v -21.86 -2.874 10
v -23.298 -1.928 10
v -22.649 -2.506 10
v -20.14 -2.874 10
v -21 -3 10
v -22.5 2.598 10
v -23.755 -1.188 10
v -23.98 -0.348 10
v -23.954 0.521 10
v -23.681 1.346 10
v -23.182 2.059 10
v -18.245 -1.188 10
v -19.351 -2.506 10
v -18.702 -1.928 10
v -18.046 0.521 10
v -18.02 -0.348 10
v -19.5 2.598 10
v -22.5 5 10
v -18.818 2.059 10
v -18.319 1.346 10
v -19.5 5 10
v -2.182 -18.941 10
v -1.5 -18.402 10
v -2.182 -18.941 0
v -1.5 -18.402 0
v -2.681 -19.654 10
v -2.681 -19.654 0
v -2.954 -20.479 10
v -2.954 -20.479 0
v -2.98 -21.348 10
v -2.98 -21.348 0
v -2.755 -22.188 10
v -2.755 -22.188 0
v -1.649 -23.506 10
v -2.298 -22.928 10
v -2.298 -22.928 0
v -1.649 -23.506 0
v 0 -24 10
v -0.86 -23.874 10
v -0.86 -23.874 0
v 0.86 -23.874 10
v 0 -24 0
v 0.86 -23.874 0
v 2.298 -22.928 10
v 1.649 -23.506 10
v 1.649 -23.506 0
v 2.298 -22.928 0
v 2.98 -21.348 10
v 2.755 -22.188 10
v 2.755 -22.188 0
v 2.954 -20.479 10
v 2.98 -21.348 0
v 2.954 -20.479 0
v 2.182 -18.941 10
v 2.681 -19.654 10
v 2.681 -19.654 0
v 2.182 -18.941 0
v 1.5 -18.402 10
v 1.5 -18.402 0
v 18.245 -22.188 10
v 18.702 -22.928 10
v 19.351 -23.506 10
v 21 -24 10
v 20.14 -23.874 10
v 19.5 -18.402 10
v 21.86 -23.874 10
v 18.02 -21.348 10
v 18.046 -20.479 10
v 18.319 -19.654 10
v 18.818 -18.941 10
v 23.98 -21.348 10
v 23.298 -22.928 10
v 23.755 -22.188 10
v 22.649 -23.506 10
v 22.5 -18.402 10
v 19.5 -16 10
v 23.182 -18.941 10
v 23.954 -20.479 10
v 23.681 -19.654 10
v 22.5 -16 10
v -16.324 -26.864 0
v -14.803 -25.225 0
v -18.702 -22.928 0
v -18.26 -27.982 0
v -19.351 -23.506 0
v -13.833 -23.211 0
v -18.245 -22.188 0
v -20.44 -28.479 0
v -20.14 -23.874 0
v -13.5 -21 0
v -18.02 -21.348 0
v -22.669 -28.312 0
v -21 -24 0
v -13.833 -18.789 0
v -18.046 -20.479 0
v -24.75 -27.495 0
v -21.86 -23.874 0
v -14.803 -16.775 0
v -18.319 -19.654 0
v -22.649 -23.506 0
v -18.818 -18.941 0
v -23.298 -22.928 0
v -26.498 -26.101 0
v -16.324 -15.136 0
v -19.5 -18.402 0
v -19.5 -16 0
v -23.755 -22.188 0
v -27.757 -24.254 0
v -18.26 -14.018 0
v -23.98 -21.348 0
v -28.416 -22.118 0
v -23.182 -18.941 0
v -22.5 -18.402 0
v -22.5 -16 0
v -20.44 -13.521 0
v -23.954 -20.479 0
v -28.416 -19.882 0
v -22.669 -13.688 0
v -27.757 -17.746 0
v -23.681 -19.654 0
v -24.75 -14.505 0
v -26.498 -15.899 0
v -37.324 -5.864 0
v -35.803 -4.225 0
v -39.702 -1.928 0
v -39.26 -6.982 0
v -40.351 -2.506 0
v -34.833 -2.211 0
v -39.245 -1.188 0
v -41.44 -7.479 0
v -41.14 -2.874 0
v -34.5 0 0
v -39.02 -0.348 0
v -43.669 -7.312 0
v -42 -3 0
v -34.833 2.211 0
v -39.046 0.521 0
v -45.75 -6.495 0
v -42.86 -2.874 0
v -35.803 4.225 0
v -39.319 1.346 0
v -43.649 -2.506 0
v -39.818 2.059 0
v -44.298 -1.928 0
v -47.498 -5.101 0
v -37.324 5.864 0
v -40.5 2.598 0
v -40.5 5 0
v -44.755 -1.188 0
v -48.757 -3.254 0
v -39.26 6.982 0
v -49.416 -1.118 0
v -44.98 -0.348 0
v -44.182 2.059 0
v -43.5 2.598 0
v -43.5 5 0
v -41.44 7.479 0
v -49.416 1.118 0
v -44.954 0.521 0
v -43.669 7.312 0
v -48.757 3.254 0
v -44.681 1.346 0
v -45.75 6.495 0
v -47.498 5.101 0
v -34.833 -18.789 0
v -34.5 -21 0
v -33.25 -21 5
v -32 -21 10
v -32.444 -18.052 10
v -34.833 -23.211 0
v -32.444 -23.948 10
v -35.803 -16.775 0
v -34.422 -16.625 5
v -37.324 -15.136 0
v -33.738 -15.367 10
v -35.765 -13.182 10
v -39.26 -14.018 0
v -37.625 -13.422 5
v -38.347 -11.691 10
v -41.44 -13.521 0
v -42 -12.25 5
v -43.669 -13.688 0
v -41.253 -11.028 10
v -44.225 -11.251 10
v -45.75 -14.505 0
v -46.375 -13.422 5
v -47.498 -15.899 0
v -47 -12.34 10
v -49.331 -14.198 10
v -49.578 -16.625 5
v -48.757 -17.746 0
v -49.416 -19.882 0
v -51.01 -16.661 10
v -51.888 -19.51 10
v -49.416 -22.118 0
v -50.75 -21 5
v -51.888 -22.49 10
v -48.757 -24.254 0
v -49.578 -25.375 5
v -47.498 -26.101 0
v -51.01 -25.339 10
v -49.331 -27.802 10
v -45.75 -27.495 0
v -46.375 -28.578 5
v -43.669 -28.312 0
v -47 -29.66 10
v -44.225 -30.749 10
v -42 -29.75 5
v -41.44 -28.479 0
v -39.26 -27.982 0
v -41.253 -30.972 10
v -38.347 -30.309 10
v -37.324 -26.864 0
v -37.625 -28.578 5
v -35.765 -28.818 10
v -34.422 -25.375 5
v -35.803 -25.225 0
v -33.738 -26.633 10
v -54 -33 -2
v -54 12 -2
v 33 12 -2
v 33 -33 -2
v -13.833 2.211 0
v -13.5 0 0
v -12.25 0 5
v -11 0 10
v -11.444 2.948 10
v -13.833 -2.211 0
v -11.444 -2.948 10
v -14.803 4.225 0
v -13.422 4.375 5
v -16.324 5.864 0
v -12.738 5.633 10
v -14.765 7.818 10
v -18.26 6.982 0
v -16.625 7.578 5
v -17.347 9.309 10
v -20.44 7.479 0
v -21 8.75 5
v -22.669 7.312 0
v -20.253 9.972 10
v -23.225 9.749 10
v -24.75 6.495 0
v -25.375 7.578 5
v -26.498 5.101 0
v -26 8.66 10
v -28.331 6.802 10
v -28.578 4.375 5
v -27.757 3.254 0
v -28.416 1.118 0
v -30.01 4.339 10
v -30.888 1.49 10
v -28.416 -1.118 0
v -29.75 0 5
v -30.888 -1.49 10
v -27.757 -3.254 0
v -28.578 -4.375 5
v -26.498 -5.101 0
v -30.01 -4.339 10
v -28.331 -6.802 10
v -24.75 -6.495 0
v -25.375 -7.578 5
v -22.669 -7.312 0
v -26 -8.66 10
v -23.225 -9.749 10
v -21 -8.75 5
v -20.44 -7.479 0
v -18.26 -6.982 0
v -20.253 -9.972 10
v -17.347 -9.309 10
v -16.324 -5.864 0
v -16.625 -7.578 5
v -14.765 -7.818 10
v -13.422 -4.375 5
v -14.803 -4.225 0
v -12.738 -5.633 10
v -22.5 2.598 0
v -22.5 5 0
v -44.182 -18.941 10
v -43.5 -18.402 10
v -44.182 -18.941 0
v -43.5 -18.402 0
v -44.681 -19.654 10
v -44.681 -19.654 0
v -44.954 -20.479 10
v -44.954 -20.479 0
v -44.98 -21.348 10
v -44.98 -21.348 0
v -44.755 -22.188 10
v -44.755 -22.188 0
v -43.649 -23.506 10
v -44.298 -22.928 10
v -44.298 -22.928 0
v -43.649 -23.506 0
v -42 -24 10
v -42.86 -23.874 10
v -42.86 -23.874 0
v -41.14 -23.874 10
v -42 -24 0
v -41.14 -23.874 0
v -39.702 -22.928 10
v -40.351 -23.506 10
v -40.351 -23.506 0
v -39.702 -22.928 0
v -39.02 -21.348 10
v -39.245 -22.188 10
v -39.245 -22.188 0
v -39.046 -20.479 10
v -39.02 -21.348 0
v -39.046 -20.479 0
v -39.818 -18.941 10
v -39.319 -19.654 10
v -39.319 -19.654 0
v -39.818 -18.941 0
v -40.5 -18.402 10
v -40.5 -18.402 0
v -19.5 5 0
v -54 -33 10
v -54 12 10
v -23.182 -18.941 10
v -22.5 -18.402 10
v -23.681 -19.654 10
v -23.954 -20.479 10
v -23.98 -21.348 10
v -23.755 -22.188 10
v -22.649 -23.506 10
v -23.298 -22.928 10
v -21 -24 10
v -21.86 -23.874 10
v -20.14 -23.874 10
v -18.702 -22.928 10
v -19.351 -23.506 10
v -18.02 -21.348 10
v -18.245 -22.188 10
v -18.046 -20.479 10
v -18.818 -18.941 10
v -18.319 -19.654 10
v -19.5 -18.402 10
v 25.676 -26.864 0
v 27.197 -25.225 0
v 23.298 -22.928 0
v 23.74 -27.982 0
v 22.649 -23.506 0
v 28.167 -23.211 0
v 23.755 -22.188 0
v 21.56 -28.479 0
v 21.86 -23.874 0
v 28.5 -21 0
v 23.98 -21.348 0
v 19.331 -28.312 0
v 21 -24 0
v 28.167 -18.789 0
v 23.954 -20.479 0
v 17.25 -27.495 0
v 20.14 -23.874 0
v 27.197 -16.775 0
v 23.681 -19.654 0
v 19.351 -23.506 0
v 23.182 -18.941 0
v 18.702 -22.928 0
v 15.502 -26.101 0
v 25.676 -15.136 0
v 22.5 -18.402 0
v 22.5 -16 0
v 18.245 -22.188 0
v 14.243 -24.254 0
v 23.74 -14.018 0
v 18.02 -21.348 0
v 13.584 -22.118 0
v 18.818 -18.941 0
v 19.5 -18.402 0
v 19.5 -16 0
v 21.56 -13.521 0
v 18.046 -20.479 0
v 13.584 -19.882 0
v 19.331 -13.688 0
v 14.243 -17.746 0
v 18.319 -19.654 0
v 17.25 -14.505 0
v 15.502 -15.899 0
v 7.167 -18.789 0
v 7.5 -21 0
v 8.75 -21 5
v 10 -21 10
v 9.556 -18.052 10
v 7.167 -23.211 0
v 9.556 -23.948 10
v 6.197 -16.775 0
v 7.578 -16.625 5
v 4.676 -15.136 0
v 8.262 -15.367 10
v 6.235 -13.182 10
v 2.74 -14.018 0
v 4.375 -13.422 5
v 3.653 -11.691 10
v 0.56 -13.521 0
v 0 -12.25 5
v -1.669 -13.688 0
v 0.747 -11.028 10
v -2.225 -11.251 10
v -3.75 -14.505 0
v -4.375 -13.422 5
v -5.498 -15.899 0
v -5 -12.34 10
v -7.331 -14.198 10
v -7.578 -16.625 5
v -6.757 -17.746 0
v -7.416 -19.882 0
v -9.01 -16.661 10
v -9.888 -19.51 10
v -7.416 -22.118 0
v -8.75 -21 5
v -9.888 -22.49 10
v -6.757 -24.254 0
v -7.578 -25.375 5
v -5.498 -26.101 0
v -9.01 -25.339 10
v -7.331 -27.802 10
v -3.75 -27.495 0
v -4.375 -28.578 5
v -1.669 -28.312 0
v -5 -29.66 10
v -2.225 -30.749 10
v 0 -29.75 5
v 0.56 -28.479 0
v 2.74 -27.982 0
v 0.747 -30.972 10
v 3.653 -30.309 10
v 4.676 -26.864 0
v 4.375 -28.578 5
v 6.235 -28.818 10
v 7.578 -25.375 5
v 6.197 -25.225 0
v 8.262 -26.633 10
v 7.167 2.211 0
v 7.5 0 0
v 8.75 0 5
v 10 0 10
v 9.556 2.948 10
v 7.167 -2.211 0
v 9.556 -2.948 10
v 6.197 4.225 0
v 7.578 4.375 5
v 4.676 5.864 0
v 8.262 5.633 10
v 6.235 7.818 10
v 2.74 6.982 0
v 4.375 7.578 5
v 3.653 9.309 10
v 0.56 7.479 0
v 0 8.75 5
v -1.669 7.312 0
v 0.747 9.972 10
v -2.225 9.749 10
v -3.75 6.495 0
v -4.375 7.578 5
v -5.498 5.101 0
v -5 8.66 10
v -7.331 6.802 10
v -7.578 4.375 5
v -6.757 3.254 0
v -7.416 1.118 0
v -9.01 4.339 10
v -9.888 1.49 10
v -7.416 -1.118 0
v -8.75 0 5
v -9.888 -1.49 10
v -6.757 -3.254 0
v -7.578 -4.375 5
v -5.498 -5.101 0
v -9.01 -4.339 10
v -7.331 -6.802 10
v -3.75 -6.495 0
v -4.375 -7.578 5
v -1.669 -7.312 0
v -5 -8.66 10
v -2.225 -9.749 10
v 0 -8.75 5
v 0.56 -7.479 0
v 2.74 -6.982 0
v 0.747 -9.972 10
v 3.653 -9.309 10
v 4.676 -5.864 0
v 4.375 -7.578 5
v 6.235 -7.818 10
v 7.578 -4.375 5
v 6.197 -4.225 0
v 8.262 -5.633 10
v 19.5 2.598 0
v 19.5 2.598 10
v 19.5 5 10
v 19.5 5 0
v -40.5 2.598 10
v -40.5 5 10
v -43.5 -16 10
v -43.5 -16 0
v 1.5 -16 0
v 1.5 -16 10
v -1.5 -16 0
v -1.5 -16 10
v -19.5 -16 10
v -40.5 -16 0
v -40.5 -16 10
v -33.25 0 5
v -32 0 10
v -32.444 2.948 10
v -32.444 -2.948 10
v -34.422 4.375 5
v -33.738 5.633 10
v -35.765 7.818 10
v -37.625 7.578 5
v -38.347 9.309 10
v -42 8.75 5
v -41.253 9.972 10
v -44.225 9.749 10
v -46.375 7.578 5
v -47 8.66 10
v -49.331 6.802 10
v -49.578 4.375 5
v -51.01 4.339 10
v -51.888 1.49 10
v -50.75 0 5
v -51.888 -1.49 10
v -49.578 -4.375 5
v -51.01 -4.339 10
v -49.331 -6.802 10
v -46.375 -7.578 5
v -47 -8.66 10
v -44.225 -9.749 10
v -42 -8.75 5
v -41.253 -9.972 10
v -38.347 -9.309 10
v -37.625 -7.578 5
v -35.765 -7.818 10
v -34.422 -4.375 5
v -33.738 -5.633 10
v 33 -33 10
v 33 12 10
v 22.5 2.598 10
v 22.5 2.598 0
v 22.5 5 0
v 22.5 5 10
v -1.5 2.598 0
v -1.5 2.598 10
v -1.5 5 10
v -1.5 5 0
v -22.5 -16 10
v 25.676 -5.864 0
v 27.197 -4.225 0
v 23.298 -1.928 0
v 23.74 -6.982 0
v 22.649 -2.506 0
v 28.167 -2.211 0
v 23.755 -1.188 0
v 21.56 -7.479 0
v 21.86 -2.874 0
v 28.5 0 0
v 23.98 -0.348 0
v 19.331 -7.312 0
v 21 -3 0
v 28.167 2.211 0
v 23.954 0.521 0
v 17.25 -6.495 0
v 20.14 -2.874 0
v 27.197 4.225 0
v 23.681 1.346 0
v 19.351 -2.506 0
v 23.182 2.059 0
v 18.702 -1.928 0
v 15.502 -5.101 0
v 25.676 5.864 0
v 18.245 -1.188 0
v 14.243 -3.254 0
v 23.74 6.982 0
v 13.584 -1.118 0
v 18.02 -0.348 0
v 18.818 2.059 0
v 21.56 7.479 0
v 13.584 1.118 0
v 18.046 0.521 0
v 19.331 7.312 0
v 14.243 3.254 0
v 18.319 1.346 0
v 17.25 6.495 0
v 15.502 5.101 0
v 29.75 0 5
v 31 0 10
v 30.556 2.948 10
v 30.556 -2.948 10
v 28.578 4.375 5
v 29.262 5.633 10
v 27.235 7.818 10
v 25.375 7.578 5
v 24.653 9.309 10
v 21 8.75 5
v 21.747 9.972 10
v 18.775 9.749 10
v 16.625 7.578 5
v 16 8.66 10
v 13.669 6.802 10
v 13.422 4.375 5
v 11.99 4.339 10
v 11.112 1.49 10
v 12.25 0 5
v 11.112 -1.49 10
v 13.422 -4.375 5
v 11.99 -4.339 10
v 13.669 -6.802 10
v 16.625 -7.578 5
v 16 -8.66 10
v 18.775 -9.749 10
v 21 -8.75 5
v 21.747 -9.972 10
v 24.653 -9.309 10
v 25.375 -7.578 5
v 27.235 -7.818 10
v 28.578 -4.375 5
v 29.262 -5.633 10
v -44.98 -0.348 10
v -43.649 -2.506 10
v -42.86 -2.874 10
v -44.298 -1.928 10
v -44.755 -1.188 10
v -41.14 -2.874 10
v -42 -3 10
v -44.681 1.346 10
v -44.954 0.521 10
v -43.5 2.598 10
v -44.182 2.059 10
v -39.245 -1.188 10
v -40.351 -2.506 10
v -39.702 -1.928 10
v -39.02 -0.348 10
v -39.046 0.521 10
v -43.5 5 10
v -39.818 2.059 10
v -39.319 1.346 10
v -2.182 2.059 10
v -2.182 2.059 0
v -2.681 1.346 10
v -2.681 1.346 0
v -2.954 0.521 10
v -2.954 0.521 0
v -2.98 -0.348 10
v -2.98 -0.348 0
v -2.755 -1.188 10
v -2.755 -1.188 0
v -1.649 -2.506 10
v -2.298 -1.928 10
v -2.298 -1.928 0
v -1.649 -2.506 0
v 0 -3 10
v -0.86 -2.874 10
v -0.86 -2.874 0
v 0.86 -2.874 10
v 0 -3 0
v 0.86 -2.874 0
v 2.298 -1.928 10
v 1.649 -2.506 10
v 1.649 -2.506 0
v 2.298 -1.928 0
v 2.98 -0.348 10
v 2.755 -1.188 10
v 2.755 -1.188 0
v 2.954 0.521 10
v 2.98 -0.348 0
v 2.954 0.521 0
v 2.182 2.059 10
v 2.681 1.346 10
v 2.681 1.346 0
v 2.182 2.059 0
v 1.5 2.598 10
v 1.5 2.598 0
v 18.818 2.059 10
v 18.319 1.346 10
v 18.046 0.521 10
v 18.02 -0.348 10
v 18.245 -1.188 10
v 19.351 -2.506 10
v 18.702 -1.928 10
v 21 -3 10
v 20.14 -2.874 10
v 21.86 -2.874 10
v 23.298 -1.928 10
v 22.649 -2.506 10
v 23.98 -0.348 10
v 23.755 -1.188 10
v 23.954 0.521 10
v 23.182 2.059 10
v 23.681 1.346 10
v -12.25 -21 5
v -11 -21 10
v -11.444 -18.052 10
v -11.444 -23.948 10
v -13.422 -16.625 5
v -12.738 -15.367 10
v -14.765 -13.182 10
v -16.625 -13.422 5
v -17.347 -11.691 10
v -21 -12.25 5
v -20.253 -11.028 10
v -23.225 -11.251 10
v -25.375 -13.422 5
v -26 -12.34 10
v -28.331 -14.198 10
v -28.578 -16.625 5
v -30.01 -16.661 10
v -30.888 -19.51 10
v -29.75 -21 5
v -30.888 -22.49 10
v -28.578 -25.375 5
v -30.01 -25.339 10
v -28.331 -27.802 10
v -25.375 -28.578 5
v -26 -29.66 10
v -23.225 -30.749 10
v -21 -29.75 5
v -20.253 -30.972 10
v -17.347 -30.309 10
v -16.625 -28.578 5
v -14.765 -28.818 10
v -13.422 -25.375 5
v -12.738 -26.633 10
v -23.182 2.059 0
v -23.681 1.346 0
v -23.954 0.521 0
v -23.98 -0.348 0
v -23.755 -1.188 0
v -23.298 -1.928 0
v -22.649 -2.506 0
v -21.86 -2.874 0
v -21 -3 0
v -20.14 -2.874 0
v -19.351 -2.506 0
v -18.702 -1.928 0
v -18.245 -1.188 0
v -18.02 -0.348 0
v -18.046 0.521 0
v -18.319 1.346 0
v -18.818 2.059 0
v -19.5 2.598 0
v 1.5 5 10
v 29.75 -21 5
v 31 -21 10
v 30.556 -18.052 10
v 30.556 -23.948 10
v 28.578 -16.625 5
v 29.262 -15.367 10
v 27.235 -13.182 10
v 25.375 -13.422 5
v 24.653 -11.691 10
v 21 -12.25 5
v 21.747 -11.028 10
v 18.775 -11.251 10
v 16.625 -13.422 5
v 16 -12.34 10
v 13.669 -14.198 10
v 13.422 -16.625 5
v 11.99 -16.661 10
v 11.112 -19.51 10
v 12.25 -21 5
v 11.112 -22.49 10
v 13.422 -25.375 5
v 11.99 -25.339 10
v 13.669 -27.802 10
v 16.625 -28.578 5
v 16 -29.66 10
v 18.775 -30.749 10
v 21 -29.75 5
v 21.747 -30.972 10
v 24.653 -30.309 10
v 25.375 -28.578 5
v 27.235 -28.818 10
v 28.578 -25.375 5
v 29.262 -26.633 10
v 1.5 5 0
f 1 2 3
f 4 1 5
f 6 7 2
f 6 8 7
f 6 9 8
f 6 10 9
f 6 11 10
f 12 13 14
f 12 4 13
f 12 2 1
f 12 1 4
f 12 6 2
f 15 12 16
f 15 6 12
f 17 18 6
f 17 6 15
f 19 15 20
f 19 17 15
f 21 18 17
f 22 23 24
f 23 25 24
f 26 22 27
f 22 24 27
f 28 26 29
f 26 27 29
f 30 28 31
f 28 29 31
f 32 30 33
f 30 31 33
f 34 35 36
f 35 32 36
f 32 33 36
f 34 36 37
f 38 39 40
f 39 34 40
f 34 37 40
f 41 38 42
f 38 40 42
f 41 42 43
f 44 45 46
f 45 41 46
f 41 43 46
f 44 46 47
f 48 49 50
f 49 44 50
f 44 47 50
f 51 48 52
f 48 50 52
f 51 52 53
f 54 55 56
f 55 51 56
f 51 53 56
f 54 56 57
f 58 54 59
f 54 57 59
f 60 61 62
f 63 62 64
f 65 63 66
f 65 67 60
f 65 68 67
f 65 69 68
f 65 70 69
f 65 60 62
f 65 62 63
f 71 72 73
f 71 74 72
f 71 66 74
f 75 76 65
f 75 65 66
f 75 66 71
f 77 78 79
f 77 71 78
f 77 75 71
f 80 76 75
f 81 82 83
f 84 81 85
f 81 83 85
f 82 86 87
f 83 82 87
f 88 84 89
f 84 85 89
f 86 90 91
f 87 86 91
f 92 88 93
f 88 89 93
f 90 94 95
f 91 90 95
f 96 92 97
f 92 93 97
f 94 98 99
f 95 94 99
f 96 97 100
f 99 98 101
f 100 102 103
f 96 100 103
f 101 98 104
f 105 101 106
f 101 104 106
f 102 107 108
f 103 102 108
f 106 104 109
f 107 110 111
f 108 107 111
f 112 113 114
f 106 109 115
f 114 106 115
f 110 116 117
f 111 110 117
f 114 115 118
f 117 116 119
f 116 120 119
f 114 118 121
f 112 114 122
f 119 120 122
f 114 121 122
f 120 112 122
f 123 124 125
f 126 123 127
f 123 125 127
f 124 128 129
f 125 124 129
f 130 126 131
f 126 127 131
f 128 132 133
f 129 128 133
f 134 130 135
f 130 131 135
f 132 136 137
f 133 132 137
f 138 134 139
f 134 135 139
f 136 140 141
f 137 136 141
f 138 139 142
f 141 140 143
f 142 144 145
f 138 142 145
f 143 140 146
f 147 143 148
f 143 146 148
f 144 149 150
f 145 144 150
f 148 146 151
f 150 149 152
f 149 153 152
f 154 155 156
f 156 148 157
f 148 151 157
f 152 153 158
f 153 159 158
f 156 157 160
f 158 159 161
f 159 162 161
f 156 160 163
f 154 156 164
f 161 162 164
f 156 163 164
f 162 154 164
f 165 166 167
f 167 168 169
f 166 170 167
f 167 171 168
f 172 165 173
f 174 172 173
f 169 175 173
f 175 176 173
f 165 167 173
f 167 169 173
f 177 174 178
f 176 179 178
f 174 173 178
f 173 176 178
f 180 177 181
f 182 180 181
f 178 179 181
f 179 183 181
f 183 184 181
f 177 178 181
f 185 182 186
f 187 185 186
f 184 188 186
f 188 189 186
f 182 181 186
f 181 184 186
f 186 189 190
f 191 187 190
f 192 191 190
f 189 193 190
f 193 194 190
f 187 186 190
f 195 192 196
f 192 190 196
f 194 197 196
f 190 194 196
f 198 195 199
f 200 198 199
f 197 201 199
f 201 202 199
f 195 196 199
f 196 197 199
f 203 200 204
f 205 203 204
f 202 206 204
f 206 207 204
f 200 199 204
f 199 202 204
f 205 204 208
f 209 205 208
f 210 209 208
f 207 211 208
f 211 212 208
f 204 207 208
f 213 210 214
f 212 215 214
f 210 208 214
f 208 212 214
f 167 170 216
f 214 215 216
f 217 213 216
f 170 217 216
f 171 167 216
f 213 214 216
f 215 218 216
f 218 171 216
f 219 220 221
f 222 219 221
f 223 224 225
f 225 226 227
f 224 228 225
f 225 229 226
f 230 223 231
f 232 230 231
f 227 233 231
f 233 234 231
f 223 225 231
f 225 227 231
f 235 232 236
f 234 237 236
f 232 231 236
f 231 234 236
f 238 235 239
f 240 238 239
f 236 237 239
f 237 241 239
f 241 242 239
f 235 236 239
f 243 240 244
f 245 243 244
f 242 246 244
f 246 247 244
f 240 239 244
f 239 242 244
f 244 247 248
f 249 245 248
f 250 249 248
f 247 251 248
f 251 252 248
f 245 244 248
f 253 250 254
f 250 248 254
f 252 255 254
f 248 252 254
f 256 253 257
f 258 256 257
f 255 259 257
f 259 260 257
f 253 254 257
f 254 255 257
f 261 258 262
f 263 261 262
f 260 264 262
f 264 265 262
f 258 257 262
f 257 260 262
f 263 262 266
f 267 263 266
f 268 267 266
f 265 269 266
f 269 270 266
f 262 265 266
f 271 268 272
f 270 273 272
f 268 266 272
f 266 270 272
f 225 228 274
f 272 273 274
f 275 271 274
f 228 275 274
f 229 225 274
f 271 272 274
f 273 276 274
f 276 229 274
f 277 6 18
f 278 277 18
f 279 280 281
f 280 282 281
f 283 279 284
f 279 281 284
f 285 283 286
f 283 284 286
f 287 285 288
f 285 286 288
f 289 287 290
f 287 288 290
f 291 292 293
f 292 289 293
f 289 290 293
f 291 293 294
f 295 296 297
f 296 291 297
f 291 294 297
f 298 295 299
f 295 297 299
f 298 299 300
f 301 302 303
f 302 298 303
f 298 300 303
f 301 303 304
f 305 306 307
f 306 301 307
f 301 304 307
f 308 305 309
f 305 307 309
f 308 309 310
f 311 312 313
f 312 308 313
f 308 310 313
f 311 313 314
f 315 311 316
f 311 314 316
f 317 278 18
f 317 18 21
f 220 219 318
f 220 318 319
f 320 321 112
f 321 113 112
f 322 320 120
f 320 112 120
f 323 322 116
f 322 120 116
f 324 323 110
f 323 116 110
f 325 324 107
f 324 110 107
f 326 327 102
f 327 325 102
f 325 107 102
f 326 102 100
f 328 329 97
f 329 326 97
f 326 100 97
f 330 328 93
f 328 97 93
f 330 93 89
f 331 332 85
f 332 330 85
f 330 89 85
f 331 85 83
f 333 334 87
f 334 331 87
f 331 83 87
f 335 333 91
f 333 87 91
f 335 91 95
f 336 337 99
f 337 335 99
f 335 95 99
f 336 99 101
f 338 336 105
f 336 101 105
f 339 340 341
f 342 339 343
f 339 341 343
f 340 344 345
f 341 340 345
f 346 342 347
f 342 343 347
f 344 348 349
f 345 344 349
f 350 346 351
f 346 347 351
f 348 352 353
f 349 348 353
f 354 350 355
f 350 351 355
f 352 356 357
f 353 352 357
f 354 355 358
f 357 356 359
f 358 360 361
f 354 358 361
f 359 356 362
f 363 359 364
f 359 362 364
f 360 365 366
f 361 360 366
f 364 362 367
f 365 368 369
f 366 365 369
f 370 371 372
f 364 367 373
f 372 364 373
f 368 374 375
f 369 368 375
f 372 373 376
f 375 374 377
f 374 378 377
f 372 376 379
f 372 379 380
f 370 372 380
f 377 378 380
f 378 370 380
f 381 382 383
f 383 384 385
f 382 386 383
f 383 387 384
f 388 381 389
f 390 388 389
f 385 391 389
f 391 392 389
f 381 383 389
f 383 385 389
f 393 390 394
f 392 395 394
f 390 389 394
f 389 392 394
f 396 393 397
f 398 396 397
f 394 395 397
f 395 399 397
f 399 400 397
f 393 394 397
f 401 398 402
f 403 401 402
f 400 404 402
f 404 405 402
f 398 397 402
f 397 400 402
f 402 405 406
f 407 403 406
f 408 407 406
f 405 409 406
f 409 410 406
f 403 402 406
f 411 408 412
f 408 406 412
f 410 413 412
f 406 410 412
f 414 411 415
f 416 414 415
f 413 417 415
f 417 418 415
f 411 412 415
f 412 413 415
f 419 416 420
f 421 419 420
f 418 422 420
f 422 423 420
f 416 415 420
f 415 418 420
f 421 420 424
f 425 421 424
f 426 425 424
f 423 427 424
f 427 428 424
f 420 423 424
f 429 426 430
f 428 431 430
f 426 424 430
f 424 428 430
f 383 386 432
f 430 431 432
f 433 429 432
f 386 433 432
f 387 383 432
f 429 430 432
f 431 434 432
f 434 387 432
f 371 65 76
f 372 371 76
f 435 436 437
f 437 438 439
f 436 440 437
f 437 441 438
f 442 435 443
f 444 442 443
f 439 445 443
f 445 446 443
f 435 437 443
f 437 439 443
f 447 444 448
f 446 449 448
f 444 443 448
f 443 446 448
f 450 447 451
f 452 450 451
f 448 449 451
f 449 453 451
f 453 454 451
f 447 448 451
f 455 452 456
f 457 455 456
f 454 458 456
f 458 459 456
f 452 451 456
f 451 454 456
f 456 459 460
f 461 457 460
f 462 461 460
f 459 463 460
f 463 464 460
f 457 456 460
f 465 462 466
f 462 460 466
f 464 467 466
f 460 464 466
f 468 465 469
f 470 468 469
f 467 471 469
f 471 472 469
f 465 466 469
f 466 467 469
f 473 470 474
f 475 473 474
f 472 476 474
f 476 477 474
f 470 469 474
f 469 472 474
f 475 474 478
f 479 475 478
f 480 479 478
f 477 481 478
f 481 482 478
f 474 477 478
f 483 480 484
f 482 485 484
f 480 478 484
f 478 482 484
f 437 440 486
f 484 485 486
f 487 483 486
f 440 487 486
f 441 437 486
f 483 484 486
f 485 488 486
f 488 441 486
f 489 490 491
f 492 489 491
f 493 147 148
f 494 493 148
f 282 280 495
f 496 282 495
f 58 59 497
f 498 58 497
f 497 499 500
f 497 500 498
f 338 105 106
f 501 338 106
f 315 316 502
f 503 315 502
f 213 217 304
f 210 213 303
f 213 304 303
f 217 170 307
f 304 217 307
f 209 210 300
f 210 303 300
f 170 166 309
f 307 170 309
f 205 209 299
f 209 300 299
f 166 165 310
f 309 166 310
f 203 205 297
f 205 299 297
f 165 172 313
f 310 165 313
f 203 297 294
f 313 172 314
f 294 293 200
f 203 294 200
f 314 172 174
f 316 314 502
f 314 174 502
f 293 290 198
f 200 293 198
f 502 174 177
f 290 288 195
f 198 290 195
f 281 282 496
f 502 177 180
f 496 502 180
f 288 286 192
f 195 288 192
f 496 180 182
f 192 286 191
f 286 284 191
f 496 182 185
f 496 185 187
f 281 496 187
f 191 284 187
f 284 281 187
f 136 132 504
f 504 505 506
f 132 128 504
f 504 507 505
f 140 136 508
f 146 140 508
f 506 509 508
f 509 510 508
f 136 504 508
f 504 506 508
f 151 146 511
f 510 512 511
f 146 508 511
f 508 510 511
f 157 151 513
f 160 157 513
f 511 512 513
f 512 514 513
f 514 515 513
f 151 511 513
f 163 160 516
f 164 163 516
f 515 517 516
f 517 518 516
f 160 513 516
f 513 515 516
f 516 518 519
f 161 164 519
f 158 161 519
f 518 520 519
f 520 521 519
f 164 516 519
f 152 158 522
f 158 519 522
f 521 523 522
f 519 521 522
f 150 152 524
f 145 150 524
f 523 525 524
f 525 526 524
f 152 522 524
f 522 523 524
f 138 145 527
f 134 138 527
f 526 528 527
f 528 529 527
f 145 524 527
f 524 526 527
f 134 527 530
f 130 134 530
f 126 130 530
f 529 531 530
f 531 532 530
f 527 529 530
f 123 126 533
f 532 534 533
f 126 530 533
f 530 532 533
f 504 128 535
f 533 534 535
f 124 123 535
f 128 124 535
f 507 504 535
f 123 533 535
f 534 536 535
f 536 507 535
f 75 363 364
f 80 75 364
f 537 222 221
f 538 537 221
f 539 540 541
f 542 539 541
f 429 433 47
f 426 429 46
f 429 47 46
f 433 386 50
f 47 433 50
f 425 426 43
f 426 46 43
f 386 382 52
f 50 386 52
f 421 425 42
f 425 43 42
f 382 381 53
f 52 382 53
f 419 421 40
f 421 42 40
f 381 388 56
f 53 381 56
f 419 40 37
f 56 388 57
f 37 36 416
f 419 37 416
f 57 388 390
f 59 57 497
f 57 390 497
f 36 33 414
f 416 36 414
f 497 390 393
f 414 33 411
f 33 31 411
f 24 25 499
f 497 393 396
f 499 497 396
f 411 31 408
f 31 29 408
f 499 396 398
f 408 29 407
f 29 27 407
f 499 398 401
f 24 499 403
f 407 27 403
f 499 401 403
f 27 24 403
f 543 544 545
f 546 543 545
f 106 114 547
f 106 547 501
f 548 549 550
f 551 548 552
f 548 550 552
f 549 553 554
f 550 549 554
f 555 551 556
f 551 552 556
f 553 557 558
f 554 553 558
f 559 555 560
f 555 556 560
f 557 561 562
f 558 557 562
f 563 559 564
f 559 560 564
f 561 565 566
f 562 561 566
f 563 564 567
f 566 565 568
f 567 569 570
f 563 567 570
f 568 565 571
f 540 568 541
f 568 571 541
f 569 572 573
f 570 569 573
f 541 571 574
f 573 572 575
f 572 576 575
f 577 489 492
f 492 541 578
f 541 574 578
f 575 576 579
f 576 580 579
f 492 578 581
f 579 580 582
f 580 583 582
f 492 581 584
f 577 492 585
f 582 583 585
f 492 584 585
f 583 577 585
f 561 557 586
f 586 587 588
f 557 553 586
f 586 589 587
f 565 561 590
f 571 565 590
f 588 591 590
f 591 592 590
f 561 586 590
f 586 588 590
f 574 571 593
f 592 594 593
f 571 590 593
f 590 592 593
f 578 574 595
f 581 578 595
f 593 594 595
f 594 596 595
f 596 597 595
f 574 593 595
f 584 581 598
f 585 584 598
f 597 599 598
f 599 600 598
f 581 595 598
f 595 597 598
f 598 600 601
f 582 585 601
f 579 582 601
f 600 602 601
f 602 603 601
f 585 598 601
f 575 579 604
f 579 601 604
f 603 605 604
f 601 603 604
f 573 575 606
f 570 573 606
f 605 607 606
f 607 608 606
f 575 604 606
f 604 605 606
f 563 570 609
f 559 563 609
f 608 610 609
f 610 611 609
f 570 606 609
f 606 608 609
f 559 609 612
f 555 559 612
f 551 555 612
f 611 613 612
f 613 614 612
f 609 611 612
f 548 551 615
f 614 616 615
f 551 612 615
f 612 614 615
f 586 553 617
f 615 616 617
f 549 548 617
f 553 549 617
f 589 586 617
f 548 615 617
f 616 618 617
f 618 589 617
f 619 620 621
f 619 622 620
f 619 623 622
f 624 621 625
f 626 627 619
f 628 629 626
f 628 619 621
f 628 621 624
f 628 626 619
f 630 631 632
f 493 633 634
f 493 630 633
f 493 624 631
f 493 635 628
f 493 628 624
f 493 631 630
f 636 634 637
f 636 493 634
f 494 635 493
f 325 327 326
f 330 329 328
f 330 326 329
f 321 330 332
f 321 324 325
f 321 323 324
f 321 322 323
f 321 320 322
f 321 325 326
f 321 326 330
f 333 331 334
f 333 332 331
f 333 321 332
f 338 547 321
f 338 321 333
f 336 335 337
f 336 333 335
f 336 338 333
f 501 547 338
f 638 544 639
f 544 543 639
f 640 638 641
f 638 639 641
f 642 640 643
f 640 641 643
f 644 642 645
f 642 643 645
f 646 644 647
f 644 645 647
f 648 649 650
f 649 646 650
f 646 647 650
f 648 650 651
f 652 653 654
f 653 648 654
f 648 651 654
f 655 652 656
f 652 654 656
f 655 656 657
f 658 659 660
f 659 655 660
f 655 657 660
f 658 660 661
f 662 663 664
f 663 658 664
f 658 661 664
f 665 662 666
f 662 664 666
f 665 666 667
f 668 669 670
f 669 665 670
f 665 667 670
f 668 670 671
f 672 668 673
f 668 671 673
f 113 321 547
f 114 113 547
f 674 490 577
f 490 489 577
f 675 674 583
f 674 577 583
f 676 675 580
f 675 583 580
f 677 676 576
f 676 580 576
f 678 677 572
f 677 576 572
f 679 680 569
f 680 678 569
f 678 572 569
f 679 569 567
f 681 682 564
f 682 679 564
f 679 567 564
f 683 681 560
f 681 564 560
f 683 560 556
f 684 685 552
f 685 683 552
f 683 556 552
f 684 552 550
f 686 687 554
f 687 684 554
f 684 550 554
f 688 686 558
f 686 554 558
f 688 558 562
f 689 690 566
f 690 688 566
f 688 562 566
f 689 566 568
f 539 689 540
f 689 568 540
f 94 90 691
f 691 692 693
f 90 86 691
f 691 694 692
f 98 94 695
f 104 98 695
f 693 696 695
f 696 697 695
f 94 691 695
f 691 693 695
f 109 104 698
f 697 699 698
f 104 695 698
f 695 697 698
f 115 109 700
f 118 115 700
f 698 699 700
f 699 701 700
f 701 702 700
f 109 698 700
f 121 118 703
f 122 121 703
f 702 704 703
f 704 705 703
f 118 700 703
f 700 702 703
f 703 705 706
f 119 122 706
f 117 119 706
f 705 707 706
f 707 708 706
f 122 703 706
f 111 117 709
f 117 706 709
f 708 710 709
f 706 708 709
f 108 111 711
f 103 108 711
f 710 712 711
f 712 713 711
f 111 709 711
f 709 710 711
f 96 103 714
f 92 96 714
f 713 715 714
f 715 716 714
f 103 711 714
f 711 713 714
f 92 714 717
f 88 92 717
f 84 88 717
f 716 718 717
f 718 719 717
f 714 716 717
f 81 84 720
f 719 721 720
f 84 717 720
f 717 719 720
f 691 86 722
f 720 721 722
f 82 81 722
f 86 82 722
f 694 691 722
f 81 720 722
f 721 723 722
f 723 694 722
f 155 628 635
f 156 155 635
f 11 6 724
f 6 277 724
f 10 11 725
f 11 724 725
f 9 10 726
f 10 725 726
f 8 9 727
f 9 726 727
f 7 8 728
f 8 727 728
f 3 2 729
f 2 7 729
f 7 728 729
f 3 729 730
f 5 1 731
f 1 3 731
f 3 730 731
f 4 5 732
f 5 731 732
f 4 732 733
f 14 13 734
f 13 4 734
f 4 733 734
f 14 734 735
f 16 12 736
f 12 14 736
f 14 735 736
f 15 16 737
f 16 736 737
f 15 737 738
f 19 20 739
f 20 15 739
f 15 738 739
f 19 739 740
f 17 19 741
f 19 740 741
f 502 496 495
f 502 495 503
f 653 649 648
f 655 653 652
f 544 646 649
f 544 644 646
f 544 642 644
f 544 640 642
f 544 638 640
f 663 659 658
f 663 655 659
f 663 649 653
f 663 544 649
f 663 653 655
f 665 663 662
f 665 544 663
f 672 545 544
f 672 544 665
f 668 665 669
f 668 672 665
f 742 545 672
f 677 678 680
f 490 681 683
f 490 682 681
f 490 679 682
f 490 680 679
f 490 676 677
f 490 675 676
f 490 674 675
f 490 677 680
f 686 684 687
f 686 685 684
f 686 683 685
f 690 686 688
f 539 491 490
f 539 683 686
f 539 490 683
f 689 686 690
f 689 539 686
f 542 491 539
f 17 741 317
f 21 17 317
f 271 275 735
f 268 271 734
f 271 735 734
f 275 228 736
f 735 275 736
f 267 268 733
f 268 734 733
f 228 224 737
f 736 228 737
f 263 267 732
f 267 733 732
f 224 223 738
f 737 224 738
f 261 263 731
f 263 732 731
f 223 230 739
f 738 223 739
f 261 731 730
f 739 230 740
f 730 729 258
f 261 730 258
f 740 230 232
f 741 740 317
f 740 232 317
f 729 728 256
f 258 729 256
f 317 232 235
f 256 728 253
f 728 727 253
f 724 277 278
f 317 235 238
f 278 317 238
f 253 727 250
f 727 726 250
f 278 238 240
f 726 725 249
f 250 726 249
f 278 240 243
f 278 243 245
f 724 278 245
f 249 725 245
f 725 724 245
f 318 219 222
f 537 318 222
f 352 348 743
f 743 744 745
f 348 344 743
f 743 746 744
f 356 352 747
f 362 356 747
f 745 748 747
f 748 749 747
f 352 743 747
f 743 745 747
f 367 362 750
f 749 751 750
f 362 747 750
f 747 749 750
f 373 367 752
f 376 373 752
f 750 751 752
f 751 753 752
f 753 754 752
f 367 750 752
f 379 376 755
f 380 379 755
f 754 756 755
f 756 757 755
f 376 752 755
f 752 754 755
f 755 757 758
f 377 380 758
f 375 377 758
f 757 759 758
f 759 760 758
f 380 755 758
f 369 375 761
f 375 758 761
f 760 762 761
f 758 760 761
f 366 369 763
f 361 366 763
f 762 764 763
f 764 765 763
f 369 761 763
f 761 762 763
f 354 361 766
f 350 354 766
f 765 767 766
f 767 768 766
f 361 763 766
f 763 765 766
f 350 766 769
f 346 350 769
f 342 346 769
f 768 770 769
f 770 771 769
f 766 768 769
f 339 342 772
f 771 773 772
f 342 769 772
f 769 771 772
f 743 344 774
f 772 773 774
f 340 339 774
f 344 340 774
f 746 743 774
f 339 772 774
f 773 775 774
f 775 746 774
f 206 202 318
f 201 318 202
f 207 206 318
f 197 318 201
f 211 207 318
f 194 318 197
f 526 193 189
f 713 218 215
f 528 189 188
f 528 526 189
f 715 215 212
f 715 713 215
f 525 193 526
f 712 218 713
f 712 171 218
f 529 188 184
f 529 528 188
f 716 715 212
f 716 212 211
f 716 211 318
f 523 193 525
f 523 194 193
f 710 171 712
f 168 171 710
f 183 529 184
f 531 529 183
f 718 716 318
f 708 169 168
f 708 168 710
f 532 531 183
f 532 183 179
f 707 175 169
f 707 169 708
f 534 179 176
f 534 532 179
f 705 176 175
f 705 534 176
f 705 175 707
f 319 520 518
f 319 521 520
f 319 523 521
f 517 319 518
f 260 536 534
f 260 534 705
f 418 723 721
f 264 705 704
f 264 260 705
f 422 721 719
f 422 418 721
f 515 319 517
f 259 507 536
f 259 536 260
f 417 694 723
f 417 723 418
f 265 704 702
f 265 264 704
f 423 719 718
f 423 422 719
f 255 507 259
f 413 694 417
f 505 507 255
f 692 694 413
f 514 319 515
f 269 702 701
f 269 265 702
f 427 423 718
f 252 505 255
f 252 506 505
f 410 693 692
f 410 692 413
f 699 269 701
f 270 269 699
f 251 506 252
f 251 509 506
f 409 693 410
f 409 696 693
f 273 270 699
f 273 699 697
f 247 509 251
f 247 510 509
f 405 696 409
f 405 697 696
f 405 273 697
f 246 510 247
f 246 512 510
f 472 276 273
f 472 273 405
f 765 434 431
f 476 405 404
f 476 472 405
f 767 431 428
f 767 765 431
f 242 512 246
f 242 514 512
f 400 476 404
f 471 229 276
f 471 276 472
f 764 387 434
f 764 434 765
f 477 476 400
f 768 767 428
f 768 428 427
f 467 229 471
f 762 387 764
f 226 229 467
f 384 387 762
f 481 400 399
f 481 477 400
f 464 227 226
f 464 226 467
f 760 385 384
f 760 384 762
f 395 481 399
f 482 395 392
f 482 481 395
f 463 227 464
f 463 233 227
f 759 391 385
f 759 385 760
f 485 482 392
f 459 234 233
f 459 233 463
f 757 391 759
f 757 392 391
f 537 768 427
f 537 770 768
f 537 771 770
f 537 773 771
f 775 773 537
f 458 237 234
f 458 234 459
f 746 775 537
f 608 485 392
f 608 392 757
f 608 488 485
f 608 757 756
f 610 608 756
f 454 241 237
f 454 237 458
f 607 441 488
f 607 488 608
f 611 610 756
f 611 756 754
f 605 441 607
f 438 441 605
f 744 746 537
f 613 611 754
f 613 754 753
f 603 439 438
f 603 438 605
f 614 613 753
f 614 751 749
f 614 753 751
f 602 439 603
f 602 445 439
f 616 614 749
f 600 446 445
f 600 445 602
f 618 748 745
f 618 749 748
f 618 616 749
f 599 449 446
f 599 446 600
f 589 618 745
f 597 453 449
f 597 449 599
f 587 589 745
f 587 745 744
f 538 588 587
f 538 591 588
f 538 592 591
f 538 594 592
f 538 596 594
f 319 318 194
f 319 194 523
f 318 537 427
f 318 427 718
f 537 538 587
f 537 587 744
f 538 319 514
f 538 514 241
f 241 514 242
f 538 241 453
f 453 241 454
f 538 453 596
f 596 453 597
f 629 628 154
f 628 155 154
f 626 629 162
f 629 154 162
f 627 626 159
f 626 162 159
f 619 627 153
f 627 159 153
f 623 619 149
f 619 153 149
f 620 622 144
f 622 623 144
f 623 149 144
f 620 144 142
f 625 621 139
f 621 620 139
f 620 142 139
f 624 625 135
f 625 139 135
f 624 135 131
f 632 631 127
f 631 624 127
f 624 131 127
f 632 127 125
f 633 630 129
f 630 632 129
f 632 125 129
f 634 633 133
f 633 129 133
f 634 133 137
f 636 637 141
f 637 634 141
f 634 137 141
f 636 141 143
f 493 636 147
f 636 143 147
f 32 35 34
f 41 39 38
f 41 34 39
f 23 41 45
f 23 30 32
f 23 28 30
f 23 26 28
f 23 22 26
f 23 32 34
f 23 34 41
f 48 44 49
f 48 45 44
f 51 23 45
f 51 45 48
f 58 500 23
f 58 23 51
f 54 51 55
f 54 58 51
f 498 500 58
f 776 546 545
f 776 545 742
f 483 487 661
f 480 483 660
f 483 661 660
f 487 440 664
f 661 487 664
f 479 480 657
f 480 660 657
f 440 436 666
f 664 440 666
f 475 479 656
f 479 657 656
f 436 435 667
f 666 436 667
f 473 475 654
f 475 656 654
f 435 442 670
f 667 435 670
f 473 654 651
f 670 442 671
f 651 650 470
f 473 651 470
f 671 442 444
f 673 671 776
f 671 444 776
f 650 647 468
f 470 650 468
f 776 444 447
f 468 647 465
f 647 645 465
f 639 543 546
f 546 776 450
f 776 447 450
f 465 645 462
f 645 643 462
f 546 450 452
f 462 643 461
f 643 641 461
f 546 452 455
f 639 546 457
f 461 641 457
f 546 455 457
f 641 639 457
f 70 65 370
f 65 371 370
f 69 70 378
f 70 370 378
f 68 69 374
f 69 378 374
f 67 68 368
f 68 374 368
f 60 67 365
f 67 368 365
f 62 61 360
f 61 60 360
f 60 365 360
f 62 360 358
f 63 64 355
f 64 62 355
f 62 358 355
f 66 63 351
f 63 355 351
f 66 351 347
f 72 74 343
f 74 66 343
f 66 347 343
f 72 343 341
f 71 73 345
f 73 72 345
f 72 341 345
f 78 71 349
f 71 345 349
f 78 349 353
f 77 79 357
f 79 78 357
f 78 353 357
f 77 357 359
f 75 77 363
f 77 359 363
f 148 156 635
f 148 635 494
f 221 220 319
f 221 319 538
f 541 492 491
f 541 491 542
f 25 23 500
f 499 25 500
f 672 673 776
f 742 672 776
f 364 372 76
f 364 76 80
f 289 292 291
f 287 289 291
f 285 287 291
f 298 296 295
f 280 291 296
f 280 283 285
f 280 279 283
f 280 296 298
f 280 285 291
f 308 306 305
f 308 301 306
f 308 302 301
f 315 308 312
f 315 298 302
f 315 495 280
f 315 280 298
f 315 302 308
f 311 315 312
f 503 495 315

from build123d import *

# Parameters (mm, degrees)
BOX019_W          = 3
BOX019_H          = 3
BOX019_DEPTH      = 10
CYLINDER022_R     = 3
CYLINDER022_DEPTH = 10
BOX020_W          = 87
BOX020_H          = 45
BOX020_DEPTH      = 12


with BuildPart() as cube019:
    # Box019 → Box019 (new body)
    with BuildSketch(Plane(origin=(-1.5, 2, 0), x_dir=(1, 0, 0), z_dir=(0, 0, 1))):
        with Locations((1.5, 1.5)):
            Rectangle(BOX019_W, BOX019_H)
    extrude(amount=BOX019_DEPTH)


with BuildPart() as fusion010:
    # Cylinder022 → Cylinder022 (new body)
    with BuildSketch(Plane.XY):
        Circle(CYLINDER022_R)
    extrude(amount=CYLINDER022_DEPTH)

    # Fusion010: union Cube019
    add(cube019.part)


with BuildPart() as kegel:
    # Cone → Cone (revolve)
    with BuildSketch(Plane.XZ):
        Polygon((0, 0), (7.5, 0), (10, 10), (0, 10), align=None)
    revolve(axis=Axis((0, 0, 0), (0, 0, 1)))


with BuildPart() as cut006:
    # Cut006 base: copy of Kegel
    add(kegel.part)

    # Cut006: cut Fusion010
    add(fusion010.part, mode=Mode.SUBTRACT)


with BuildPart() as cut006_1:
    # Cut006 placement: moved
    add(cut006.part.moved(Location((0, -21, 0))))


with BuildPart() as cut007:
    # Cut007 base: copy of Kegel
    add(kegel.part)

    # Cut007: cut Fusion010
    add(fusion010.part, mode=Mode.SUBTRACT)


with BuildPart() as cut007_1:
    # Cut007 placement: moved
    add(cut007.part.moved(Location((-42, -21, 0))))


with BuildPart() as cut008:
    # Cut008 base: copy of Kegel
    add(kegel.part)

    # Cut008: cut Fusion010
    add(fusion010.part, mode=Mode.SUBTRACT)


with BuildPart() as cut008_1:
    # Cut008 placement: moved
    add(cut008.part.moved(Location((21, 0, 0))))


with BuildPart() as cut009:
    # Cut009 base: copy of Kegel
    add(kegel.part)

    # Cut009: cut Fusion010
    add(fusion010.part, mode=Mode.SUBTRACT)


with BuildPart() as cut009_1:
    # Cut009 placement: moved
    add(cut009.part.moved(Location((-42, 0, 0))))


with BuildPart() as cut010:
    # Cut010 base: copy of Kegel
    add(kegel.part)

    # Cut010: cut Fusion010
    add(fusion010.part, mode=Mode.SUBTRACT)


with BuildPart() as cut011:
    # Cut011 base: copy of Kegel
    add(kegel.part)

    # Cut011: cut Fusion010
    add(fusion010.part, mode=Mode.SUBTRACT)


with BuildPart() as cut011_1:
    # Cut011 placement: moved
    add(cut011.part.moved(Location((-21, -21, 0))))


with BuildPart() as cut012:
    # Cut012 base: copy of Kegel
    add(kegel.part)

    # Cut012: cut Fusion010
    add(fusion010.part, mode=Mode.SUBTRACT)


with BuildPart() as cut012_1:
    # Cut012 placement: moved
    add(cut012.part.moved(Location((-21, 0, 0))))


with BuildPart() as fusion011:
    # Cut005 base: copy of Kegel
    add(kegel.part)

    # Cut005: cut Fusion010
    add(fusion010.part, mode=Mode.SUBTRACT)


with BuildPart() as fusion011_1:
    # Cut005 placement: moved
    add(fusion011.part.moved(Location((21, -21, 0))))

    # Fusion011: union Cut006, Cut007, Cut008, Cut009, Cut010, Cut011, Cut012
    add(cut006_1.part)
    add(cut007_1.part)
    add(cut008_1.part)
    add(cut009_1.part)
    add(cut010.part)
    add(cut011_1.part)
    add(cut012_1.part)


with BuildPart() as zapfen:
    # Box020 → Box020 (new body)
    with BuildSketch(Plane(origin=(-54, -33, -2), x_dir=(1, 0, 0), z_dir=(0, 0, 1))):
        with Locations((43.5, 22.5)):
            Rectangle(BOX020_W, BOX020_H)
    extrude(amount=BOX020_DEPTH)

    # Cut013: cut Fusion011
    add(fusion011_1.part, mode=Mode.SUBTRACT)


solid = zapfen.part
